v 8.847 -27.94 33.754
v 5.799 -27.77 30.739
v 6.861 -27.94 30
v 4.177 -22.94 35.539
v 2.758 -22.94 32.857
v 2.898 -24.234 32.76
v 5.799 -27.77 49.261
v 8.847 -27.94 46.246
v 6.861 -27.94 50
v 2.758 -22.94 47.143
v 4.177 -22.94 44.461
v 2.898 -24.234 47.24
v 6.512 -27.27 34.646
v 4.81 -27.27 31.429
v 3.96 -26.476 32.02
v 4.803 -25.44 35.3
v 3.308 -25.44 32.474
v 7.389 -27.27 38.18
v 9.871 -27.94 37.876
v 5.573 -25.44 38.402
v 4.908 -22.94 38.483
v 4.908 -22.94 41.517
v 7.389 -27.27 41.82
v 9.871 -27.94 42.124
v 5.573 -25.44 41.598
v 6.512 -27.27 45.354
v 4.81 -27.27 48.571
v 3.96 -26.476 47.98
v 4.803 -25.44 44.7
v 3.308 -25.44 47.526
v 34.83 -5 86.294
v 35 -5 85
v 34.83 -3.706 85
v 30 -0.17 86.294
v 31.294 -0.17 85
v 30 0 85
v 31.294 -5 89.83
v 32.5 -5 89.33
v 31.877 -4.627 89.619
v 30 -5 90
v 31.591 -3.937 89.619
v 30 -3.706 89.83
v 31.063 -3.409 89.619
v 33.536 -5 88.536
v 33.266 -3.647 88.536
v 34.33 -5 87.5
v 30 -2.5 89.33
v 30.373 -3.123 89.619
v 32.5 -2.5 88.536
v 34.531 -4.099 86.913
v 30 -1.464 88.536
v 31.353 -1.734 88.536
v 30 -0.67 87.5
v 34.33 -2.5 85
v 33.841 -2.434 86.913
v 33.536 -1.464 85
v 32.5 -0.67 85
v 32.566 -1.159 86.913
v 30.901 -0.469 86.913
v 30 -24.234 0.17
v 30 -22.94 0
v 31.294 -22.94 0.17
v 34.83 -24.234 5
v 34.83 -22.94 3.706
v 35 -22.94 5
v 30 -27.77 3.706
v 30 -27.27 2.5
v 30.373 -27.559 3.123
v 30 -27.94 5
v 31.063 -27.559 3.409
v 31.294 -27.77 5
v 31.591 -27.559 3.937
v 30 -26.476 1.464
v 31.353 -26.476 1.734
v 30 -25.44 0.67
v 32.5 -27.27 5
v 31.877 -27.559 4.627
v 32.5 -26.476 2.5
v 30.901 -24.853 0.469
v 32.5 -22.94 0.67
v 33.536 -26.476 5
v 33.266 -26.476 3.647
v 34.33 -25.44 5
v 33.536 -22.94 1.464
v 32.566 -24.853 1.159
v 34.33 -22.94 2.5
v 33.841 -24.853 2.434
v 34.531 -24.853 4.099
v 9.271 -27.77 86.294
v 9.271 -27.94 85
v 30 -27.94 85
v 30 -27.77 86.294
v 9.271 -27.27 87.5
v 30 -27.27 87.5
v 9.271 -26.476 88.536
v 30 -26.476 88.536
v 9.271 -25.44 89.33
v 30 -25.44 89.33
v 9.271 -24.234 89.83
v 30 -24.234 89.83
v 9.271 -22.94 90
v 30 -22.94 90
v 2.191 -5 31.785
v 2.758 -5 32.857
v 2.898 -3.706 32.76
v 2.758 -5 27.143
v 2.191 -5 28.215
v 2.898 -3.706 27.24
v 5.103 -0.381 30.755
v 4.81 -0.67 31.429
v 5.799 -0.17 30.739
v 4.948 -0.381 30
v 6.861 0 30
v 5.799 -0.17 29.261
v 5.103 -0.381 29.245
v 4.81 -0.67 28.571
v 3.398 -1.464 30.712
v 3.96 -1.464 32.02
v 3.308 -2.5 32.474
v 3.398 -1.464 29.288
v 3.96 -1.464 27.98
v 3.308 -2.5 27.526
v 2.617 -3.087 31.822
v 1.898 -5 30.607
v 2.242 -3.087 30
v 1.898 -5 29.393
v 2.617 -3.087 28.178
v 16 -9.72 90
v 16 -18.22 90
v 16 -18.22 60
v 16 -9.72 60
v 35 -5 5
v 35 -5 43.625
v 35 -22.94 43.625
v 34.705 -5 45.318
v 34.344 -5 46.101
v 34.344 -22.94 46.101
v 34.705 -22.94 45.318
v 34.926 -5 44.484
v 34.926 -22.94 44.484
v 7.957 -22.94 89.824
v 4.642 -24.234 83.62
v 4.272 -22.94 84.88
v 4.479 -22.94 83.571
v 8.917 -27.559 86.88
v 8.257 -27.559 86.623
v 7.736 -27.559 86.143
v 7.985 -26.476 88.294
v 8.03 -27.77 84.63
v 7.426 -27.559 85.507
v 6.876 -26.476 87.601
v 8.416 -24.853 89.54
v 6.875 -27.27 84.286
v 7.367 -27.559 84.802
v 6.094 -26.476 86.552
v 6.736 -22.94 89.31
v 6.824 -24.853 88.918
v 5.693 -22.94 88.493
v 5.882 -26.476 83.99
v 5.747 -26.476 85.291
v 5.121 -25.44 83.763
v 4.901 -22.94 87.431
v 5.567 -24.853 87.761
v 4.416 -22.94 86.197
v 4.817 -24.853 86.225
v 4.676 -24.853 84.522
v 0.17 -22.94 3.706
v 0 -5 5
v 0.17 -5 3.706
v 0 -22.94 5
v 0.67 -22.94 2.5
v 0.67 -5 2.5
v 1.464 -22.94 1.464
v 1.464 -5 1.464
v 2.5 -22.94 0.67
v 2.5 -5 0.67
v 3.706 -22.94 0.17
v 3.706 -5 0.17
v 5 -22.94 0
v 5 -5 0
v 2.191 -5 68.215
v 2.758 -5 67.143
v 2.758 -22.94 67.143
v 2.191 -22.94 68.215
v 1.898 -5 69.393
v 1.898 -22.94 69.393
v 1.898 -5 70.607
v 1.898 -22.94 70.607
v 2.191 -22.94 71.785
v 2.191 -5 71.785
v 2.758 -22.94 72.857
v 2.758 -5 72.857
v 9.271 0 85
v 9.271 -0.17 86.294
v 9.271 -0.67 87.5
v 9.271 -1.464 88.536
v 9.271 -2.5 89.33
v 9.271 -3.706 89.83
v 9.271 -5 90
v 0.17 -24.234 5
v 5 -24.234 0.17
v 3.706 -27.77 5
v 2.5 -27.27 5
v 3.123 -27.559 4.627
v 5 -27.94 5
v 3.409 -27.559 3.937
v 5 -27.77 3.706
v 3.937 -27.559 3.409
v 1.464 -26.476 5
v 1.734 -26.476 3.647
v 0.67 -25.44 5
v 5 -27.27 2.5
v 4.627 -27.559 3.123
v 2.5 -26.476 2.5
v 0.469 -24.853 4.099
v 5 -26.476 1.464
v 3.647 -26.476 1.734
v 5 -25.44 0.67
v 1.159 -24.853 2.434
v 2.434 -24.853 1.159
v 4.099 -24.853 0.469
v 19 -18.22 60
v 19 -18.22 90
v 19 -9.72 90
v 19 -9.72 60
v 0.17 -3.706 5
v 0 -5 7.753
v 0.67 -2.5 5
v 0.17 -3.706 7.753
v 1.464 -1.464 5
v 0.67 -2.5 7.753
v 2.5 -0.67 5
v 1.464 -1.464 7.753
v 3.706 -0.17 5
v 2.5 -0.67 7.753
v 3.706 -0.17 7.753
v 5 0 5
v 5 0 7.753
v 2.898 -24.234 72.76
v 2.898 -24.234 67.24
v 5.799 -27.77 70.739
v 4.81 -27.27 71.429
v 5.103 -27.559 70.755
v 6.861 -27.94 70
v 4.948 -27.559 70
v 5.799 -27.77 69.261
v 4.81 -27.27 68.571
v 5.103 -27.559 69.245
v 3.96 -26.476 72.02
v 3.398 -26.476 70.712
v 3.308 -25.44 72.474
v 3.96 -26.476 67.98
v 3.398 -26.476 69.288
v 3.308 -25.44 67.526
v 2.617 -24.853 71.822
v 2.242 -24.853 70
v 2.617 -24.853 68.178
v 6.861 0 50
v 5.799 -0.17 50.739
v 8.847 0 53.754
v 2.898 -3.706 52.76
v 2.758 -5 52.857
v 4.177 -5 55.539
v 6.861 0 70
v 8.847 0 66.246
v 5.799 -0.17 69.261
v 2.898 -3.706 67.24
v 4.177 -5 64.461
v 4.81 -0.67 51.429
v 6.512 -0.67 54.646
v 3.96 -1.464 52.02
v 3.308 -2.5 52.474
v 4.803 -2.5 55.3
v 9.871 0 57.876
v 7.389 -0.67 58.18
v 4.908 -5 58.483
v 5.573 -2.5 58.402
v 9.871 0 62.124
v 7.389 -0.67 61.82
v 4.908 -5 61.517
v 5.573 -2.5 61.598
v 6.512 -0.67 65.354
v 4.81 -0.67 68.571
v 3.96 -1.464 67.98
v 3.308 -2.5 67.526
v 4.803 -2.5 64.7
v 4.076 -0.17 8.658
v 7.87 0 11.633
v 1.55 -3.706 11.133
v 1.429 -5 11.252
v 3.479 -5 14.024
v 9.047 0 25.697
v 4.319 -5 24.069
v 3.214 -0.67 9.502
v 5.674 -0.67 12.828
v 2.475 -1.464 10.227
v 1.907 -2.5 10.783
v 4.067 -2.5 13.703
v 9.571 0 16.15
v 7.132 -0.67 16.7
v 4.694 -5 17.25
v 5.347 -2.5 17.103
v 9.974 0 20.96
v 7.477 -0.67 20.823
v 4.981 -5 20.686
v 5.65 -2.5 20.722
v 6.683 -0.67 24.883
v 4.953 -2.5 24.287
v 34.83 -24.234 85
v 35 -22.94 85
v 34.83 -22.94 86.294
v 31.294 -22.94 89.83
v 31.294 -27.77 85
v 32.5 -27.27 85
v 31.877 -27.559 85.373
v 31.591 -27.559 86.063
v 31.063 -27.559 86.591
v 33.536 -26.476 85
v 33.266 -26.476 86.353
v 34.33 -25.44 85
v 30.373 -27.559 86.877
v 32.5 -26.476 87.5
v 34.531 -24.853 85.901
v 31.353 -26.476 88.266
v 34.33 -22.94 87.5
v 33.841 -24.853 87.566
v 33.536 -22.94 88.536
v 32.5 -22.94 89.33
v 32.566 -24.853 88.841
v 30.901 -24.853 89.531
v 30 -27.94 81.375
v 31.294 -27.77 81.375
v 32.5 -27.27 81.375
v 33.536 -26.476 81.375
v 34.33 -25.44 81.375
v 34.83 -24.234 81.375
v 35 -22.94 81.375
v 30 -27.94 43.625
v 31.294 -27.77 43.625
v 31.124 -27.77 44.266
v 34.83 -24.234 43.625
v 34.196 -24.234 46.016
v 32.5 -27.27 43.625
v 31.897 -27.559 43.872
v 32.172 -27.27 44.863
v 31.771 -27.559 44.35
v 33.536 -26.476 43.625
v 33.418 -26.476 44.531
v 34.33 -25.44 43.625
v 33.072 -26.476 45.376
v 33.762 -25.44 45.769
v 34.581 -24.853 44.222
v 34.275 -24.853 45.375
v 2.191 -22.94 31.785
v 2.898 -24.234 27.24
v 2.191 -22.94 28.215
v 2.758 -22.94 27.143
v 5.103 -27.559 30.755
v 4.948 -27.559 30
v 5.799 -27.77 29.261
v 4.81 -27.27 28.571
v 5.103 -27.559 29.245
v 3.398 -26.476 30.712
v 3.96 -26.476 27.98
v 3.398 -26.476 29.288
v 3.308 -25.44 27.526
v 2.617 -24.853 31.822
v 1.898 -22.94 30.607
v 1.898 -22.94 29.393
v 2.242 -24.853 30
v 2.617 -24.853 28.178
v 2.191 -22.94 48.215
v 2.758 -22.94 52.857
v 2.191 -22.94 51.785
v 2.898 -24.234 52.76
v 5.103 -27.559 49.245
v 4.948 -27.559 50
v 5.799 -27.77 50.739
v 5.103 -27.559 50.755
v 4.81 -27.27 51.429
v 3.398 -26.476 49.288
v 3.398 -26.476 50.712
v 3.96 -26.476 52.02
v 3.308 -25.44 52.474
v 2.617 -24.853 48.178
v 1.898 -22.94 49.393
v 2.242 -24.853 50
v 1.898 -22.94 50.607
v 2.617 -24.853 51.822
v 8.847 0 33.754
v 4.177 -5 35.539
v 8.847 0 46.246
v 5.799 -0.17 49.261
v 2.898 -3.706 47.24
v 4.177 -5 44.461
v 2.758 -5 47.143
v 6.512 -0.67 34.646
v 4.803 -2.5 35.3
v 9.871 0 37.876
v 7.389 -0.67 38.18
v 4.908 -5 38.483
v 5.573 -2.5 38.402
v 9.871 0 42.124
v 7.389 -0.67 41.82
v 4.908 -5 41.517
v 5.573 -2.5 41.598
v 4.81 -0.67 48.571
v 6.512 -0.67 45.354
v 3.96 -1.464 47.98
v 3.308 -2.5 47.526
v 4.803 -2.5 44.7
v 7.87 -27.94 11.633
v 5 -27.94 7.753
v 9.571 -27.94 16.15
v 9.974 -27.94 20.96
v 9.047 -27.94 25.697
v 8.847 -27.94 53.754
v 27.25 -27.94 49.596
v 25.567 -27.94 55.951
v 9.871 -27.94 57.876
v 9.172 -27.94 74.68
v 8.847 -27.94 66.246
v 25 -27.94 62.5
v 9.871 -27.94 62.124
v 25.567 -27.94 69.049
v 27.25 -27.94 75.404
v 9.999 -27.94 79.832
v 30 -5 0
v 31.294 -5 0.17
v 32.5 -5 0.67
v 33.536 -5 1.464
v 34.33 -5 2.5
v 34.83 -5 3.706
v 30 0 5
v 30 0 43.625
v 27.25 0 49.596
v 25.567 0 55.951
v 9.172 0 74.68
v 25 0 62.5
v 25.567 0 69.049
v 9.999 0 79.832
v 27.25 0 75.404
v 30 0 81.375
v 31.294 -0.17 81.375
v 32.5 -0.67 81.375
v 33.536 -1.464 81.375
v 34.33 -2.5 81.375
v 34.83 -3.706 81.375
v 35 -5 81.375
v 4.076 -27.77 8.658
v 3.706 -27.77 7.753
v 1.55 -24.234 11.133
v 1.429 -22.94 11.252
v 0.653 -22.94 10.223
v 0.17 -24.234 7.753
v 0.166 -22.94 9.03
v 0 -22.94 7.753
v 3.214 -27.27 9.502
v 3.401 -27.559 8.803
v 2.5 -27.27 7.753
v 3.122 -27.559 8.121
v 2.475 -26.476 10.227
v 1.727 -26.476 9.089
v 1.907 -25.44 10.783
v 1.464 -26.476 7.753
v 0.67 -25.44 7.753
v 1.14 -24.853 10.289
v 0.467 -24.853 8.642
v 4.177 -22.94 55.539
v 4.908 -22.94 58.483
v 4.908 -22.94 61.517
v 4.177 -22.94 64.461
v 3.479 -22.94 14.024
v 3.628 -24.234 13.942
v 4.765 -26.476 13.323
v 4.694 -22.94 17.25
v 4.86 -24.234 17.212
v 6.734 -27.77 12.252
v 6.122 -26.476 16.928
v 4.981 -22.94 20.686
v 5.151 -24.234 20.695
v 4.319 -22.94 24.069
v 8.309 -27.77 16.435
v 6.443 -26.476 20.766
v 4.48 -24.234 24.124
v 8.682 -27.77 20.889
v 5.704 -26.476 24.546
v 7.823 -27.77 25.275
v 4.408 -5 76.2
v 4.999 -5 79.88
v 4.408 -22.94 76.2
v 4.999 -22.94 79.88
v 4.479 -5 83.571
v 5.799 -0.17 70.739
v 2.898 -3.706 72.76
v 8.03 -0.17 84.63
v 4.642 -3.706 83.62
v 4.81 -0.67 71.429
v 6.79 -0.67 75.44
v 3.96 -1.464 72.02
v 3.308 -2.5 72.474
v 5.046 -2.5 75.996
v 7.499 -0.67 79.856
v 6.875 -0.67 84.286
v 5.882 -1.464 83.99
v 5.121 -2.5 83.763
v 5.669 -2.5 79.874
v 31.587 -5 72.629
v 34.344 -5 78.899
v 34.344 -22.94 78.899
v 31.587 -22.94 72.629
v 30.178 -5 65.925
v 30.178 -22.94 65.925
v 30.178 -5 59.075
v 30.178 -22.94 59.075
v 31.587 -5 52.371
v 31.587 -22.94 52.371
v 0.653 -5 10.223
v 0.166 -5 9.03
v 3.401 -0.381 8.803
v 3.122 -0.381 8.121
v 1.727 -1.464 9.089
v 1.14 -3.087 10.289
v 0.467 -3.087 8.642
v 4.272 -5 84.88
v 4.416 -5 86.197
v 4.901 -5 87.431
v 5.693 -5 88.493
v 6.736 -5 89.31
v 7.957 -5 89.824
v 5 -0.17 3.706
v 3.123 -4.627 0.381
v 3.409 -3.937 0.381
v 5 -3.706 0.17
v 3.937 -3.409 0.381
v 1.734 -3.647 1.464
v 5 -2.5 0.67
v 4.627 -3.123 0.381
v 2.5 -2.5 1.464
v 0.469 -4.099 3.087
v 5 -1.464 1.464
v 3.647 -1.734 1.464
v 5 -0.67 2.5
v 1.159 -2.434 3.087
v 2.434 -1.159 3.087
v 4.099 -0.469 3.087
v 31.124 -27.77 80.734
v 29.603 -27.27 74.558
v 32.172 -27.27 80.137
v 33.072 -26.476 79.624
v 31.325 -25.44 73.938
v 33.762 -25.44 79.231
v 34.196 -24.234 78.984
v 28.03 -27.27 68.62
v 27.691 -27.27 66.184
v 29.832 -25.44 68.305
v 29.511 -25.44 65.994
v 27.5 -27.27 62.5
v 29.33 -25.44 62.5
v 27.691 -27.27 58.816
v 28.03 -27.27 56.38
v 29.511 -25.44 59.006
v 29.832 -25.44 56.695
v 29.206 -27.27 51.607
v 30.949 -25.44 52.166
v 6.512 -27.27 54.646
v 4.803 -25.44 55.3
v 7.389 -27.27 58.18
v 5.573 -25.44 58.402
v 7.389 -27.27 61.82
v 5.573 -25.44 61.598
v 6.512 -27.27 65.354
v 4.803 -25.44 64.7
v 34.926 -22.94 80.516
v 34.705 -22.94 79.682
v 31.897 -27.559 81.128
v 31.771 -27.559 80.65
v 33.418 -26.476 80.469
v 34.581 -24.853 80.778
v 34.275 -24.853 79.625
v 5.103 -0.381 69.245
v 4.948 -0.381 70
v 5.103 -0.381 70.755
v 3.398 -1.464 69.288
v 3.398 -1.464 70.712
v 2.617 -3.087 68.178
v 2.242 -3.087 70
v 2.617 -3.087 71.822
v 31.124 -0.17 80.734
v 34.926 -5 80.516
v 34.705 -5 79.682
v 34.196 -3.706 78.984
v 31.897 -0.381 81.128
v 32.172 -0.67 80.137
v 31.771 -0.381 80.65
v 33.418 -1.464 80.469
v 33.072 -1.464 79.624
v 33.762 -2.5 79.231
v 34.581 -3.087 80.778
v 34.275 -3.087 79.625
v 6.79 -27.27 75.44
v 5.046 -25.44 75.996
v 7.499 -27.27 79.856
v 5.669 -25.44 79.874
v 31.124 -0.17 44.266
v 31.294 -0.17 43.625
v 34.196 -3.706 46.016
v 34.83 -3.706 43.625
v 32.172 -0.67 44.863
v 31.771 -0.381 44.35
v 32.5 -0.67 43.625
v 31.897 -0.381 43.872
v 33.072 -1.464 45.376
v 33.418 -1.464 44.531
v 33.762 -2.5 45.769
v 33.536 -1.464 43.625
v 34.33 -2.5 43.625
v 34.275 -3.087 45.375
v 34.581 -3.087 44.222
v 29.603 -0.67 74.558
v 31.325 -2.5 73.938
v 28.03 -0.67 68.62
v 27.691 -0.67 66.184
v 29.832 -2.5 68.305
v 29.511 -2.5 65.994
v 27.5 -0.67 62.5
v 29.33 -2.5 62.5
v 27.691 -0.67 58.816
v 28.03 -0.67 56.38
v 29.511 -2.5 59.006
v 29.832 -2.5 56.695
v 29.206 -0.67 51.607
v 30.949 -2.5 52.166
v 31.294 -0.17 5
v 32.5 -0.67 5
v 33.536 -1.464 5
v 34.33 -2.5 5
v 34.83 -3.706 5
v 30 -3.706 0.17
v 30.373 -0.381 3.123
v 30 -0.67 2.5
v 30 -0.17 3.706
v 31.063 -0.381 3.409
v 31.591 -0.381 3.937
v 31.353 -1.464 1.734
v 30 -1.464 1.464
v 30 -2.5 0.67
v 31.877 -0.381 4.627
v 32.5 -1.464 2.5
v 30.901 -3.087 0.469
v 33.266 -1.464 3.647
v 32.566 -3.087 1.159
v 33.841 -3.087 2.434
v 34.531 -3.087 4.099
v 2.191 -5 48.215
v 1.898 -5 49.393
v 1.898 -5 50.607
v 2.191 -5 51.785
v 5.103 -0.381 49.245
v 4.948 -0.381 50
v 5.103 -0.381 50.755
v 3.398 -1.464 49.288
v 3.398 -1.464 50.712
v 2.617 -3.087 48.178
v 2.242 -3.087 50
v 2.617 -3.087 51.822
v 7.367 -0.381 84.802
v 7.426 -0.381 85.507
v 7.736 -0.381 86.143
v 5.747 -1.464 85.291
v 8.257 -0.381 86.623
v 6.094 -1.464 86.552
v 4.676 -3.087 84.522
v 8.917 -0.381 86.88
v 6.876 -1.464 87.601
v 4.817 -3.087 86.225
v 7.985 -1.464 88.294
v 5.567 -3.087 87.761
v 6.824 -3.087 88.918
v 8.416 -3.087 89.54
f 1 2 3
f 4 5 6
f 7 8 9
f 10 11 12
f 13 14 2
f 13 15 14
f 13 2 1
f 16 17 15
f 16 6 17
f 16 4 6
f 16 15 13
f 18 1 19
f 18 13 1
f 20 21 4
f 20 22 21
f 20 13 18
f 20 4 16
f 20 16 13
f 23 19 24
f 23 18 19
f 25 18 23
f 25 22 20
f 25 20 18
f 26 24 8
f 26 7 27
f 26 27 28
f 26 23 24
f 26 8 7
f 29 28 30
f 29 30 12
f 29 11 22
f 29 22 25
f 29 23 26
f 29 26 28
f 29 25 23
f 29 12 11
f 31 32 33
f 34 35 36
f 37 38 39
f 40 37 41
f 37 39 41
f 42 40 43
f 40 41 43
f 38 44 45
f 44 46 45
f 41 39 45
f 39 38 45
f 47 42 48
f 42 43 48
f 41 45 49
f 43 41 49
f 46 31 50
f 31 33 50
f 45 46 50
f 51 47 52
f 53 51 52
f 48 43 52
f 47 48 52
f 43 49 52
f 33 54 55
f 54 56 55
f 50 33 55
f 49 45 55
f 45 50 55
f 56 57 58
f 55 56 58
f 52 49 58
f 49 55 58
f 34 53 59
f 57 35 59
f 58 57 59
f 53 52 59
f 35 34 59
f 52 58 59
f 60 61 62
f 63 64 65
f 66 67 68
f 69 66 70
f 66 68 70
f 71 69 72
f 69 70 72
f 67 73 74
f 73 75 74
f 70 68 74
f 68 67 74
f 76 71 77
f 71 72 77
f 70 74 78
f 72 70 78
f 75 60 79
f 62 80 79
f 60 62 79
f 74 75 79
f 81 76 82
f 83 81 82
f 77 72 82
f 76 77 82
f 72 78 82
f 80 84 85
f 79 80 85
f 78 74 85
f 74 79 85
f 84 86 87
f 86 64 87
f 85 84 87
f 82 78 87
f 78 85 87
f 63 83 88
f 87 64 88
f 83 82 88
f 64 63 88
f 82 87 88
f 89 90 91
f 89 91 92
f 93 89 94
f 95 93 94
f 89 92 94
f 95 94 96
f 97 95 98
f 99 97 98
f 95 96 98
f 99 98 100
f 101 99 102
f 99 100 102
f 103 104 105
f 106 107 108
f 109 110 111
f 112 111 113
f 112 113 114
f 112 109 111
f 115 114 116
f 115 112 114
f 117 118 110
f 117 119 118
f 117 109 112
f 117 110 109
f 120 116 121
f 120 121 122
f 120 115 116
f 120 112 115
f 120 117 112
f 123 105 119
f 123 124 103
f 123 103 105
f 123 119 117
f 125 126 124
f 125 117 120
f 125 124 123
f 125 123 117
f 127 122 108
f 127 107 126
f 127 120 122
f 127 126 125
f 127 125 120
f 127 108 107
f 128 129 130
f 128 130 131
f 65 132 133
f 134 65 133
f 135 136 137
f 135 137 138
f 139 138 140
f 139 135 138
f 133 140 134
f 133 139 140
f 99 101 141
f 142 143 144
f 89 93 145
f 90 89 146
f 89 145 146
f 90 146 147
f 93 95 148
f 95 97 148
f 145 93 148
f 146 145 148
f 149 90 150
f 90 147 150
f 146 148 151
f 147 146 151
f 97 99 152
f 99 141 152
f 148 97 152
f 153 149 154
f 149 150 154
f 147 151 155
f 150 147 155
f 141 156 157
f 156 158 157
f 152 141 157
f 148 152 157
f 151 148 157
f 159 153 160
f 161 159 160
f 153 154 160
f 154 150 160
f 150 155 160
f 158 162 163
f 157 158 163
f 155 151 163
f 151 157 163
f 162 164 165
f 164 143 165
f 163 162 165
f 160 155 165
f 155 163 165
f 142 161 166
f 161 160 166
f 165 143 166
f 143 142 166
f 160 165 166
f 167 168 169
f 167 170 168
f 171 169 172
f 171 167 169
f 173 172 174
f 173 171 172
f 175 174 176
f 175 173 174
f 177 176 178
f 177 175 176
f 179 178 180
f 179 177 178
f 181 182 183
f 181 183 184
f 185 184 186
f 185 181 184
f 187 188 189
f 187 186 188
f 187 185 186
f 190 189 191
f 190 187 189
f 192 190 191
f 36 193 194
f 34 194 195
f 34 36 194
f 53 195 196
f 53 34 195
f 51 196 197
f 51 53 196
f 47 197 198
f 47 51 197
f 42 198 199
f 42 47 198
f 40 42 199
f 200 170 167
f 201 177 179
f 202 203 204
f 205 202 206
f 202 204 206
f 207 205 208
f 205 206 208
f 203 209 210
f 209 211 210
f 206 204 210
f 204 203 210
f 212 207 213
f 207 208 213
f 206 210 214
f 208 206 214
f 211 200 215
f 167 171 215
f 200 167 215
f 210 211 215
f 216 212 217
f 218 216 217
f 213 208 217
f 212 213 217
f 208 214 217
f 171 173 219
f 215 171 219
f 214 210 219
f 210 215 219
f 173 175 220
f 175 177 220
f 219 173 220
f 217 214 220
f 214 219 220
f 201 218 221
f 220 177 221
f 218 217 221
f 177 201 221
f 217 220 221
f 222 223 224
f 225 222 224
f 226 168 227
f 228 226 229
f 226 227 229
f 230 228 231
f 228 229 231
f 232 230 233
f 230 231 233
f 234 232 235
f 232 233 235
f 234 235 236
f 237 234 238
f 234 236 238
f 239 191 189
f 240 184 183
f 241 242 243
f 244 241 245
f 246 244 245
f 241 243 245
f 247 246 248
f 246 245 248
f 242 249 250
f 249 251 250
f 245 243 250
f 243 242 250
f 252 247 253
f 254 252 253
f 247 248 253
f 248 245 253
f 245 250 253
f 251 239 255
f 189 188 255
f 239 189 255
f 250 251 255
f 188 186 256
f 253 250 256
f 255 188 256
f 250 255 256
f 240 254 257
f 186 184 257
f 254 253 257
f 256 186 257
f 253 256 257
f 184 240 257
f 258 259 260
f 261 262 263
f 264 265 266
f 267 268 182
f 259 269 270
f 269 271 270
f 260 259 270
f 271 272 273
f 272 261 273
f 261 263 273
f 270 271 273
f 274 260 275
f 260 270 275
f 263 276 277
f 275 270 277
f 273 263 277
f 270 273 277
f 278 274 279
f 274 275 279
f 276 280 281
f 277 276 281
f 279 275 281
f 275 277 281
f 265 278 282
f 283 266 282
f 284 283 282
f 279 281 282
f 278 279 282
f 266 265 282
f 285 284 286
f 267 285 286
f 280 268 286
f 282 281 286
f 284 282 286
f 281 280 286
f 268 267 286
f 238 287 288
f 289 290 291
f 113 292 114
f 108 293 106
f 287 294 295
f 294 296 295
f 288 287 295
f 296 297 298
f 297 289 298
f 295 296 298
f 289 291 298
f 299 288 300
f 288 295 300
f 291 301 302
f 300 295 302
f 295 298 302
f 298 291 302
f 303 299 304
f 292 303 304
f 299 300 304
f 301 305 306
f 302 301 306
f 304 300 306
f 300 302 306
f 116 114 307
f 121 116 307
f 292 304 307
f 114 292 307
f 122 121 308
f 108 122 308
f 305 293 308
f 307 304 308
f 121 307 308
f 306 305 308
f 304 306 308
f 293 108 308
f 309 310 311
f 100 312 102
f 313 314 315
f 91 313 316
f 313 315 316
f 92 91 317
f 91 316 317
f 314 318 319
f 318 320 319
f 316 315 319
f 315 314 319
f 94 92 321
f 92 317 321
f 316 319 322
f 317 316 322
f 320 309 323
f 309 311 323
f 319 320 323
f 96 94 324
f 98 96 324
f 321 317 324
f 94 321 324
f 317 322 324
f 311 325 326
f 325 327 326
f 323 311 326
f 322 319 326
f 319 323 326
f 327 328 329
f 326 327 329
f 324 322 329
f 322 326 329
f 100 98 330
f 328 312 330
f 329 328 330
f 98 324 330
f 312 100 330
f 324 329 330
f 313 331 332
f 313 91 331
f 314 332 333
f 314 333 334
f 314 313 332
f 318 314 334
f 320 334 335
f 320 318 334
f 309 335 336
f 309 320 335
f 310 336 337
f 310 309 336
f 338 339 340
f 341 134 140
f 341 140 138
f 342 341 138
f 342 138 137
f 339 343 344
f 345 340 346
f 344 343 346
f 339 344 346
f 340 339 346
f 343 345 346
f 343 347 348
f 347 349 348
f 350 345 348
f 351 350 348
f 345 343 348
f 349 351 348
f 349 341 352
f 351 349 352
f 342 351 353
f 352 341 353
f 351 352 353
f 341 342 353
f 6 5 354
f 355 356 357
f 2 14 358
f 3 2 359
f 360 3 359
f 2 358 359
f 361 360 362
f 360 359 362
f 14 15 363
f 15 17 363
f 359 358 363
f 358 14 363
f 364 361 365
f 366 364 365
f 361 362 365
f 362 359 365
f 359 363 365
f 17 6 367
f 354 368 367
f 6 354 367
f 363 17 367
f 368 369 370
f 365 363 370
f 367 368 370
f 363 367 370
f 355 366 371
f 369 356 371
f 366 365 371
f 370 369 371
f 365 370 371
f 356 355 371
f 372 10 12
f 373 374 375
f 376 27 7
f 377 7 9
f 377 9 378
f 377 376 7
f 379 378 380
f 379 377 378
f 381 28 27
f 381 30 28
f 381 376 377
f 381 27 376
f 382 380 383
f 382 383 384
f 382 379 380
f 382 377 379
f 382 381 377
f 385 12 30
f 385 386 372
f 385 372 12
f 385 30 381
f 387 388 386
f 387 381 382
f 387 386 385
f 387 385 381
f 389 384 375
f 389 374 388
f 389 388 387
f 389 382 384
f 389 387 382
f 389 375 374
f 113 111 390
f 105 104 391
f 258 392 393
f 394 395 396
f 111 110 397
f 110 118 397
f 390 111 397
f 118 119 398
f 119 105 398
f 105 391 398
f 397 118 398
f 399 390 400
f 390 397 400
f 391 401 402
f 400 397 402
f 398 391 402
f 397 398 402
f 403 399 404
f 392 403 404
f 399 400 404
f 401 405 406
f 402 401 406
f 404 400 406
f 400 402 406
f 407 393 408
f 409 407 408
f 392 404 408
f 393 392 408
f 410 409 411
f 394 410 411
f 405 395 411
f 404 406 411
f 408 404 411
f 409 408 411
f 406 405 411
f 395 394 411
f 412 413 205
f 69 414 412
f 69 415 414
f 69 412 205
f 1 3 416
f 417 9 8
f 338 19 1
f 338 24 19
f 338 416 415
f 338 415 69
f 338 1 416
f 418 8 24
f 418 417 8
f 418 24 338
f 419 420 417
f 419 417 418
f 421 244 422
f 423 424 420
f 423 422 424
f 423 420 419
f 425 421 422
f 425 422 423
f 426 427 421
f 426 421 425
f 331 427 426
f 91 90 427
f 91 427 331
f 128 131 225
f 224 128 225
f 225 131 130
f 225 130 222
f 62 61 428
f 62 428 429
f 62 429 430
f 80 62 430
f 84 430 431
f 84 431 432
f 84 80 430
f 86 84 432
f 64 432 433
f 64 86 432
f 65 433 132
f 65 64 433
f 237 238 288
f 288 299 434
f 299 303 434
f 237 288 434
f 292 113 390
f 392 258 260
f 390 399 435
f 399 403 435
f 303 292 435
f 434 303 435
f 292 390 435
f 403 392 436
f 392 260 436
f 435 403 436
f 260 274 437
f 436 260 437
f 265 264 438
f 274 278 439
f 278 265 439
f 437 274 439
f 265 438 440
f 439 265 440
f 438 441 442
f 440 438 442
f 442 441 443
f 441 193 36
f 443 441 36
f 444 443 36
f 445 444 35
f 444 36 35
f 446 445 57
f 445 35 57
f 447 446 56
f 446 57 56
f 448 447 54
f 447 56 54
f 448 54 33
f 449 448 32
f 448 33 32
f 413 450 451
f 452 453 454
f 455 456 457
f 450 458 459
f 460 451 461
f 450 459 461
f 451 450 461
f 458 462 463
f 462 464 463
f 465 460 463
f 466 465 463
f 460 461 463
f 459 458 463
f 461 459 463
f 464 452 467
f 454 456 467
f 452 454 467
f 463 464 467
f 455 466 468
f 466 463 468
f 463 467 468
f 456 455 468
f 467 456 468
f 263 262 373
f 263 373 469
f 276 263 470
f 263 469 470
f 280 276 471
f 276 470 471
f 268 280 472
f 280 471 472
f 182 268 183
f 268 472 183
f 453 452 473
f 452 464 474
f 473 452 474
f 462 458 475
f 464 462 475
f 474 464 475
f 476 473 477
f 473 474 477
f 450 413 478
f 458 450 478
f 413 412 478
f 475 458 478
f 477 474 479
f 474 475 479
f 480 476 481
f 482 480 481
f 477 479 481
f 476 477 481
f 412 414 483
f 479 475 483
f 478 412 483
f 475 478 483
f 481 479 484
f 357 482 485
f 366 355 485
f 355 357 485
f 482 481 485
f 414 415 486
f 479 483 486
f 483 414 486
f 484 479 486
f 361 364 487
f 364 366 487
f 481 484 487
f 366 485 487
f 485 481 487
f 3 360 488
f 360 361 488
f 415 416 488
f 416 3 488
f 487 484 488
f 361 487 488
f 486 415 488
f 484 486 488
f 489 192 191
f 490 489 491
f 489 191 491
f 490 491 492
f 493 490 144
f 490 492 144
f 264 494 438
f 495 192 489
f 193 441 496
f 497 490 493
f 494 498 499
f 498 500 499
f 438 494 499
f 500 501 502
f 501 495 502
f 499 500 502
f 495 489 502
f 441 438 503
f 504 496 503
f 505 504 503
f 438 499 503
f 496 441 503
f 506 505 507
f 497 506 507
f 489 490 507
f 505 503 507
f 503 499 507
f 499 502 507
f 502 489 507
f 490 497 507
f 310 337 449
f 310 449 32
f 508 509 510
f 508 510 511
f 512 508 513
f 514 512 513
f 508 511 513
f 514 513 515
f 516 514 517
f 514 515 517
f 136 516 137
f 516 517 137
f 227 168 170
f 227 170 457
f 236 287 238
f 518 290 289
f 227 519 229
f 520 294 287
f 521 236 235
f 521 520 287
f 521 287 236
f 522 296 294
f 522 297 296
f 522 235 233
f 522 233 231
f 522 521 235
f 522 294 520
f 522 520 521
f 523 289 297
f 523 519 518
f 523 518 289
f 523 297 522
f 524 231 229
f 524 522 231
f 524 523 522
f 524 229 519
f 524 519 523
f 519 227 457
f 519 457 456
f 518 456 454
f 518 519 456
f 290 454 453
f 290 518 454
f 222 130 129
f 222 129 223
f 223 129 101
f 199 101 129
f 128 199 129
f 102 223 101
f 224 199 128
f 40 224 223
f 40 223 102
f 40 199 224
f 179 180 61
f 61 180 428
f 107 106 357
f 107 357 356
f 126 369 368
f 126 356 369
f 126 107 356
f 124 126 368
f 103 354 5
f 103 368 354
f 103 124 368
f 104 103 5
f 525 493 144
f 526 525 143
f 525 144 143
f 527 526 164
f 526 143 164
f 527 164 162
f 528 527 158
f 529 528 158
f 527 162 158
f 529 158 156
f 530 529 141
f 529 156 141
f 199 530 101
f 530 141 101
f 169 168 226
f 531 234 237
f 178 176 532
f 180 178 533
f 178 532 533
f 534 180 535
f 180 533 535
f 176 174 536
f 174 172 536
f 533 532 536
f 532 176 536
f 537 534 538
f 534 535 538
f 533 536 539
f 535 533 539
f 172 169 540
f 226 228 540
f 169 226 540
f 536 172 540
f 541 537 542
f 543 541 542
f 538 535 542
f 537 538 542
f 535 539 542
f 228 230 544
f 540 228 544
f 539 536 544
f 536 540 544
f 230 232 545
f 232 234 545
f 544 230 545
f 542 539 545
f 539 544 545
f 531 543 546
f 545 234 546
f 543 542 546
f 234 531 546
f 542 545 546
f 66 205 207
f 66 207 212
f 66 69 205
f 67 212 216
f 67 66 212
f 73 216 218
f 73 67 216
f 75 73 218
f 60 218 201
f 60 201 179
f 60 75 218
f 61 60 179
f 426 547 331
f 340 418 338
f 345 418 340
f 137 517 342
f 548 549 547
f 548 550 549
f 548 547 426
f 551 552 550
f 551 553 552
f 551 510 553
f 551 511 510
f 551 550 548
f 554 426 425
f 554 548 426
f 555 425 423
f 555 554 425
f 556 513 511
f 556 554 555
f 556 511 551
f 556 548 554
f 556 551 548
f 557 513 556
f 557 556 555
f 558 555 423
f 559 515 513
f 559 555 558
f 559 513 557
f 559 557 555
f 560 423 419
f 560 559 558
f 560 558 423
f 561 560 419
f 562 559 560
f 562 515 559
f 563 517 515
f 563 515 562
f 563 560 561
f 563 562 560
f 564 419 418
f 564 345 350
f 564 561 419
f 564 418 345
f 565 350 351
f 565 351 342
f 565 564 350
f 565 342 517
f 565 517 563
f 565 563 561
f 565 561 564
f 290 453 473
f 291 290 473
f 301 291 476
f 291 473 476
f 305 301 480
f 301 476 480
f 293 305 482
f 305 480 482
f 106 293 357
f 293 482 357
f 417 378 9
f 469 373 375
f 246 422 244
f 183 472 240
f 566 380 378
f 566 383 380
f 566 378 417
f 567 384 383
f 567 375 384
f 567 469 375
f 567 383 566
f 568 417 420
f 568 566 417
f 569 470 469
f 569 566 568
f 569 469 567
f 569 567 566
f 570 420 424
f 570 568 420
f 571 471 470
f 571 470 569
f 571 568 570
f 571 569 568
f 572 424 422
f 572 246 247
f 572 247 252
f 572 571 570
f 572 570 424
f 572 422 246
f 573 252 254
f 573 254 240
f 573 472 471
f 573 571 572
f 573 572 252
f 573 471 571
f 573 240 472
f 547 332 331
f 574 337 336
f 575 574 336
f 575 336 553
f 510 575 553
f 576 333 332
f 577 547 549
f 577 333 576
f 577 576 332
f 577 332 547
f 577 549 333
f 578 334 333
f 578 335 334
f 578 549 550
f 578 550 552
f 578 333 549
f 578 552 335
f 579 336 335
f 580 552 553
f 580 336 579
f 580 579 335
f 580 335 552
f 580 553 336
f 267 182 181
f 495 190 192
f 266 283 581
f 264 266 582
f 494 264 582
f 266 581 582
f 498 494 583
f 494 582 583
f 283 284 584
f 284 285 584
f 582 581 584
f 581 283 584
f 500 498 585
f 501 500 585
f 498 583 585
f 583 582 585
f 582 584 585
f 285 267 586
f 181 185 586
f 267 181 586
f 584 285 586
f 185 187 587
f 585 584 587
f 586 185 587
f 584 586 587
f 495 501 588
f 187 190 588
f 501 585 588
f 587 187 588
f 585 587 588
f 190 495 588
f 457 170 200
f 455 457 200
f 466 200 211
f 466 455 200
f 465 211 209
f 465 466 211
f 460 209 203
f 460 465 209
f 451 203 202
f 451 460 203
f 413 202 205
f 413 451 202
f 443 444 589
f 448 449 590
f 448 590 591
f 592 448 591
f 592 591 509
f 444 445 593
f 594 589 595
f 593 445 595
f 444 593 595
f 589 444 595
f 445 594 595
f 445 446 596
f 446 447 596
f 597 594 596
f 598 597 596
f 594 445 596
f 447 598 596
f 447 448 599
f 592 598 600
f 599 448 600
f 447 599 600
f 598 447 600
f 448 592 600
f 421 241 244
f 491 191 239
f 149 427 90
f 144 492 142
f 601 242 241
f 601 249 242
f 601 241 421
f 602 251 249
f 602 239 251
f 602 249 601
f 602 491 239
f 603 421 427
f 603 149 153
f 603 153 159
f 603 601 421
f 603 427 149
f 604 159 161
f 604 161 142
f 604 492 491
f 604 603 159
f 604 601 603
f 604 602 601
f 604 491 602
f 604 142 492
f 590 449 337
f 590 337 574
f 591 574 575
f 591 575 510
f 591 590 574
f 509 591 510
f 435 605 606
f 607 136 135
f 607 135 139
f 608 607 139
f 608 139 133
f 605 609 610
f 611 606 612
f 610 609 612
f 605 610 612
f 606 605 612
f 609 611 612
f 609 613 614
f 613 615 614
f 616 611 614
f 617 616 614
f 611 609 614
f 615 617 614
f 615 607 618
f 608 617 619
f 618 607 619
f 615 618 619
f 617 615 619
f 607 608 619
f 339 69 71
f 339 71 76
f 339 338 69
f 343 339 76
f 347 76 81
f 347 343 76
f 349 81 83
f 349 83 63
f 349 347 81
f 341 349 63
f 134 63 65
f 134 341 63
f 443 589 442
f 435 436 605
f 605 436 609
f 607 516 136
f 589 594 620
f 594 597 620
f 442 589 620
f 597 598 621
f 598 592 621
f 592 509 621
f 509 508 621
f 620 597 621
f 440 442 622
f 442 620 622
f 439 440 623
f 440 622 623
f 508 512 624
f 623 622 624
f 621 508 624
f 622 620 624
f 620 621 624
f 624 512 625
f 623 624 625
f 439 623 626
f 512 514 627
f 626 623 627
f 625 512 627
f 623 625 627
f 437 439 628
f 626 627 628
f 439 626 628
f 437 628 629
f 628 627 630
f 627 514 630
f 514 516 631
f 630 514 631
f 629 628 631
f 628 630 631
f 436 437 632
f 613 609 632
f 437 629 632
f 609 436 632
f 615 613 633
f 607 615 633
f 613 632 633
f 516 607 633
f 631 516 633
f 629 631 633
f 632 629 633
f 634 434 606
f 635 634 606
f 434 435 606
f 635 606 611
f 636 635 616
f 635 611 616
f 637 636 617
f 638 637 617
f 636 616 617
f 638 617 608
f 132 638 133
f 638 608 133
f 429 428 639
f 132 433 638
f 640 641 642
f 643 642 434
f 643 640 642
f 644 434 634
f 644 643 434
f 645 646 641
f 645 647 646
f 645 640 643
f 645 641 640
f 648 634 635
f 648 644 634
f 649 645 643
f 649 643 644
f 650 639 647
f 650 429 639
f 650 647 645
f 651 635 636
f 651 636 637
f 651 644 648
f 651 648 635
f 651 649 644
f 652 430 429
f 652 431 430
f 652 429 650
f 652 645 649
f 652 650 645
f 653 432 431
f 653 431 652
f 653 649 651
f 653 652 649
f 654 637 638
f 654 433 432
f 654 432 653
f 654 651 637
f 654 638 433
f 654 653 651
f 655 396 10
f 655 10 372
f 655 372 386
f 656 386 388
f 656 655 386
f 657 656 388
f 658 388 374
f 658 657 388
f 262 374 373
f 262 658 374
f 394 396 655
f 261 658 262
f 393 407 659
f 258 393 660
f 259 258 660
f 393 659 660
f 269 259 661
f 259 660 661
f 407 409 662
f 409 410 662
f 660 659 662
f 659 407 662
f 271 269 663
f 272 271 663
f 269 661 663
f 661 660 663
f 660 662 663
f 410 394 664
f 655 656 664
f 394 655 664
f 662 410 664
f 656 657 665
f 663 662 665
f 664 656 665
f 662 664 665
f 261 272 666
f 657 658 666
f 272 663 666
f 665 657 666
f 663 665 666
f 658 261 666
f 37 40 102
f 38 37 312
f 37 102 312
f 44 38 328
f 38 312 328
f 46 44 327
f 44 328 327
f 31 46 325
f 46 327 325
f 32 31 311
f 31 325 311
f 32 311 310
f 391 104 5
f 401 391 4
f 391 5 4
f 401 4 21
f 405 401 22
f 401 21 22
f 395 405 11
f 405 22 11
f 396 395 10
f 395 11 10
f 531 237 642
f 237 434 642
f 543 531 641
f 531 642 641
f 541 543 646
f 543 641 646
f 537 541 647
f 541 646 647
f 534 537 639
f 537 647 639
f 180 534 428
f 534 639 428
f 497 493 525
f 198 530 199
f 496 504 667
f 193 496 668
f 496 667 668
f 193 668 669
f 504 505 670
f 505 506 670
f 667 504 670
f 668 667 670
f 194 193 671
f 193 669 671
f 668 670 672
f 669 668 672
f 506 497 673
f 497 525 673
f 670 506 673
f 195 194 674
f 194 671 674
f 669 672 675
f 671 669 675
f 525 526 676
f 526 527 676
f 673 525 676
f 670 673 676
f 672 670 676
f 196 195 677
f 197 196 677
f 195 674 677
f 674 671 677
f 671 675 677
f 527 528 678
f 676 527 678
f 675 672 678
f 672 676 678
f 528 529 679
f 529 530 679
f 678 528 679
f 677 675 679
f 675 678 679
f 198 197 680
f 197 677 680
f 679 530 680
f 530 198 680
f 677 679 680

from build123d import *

# Parameters (mm, degrees)
F0_W     = 35
F0_H     = 90
F1_DEPTH = 27.94
F3_DEPTH = 27.941
F4_W     = 3
F4_H     = 8.5
F5_DEPTH = 30
F6_R     = 5


with BuildPart() as f1:
    # F0 (on Front) → F1 (new body)
    with BuildSketch(Plane.XZ):
        with Locations((17.5, 45)):
            Rectangle(F0_W, F0_H)
    extrude(amount=F1_DEPTH)

    # F2 (on face) → F3 (cut, through all)
    with BuildSketch(Plane.XZ.offset(27.94)):
        with BuildLine():
            Line((35, 45), (35, 80))
            ThreePointArc((35, 80), (30, 62.5), (35, 45))
        make_face()
        with BuildLine():
            ThreePointArc((0, 70), (5, 80), (0, 90))
            Line((0, 90), (0, 70))
        make_face()
        with BuildLine():
            ThreePointArc((0, 50), (5, 60), (0, 70))
            Line((0, 70), (0, 50))
        make_face()
        with BuildLine():
            ThreePointArc((0, 30), (5, 40), (0, 50))
            Line((0, 50), (0, 30))
        make_face()
        with BuildLine():
            Line((0, 30), (0, 10))
            ThreePointArc((0, 10), (5, 20), (0, 30))
        make_face()
    extrude(amount=-F3_DEPTH, mode=Mode.SUBTRACT)

    # F4 (on face) → F5 (cut)
    with BuildSketch(Plane.XY.offset(90)):
        with Locations((17.5, -13.97)):
            Rectangle(F4_W, F4_H)
    extrude(amount=-F5_DEPTH, mode=Mode.SUBTRACT)

    # F6
    f6_edges = [f1.edges().sort_by_distance(p)[0] for p in [
        (5, -27.94, 60),
        (0, -13.97, 70),
        (5, 0, 60),
        (0, -13.97, 50),
        (5, -27.94, 80),
        (0, -13.97, 90),
        (5, 0, 80),
        (5, 0, 40),
        (5, -27.94, 40),
        (0, 0, 5),
        (0, -13.97, 0),
        (0, -27.94, 5),
        (0, -13.97, 10),
        (35, -13.97, 0),
        (17.5, 0, 0),
        (17.5, -27.94, 0),
        (35, 0, 22.5),
        (35, -13.97, 45),
        (35, -27.94, 22.5),
        (30, -27.94, 62.5),
        (30, 0, 62.5),
        (35, -13.97, 80),
        (35, 0, 85),
        (35, -13.97, 90),
        (35, -27.94, 85),
        (17.5, 0, 90),
        (17.5, -27.94, 90),
        (5, -27.94, 20),
        (5, 0, 20),
        (0, -13.97, 30),
    ]]
    fillet(f6_edges, radius=F6_R)


solid = f1.part
